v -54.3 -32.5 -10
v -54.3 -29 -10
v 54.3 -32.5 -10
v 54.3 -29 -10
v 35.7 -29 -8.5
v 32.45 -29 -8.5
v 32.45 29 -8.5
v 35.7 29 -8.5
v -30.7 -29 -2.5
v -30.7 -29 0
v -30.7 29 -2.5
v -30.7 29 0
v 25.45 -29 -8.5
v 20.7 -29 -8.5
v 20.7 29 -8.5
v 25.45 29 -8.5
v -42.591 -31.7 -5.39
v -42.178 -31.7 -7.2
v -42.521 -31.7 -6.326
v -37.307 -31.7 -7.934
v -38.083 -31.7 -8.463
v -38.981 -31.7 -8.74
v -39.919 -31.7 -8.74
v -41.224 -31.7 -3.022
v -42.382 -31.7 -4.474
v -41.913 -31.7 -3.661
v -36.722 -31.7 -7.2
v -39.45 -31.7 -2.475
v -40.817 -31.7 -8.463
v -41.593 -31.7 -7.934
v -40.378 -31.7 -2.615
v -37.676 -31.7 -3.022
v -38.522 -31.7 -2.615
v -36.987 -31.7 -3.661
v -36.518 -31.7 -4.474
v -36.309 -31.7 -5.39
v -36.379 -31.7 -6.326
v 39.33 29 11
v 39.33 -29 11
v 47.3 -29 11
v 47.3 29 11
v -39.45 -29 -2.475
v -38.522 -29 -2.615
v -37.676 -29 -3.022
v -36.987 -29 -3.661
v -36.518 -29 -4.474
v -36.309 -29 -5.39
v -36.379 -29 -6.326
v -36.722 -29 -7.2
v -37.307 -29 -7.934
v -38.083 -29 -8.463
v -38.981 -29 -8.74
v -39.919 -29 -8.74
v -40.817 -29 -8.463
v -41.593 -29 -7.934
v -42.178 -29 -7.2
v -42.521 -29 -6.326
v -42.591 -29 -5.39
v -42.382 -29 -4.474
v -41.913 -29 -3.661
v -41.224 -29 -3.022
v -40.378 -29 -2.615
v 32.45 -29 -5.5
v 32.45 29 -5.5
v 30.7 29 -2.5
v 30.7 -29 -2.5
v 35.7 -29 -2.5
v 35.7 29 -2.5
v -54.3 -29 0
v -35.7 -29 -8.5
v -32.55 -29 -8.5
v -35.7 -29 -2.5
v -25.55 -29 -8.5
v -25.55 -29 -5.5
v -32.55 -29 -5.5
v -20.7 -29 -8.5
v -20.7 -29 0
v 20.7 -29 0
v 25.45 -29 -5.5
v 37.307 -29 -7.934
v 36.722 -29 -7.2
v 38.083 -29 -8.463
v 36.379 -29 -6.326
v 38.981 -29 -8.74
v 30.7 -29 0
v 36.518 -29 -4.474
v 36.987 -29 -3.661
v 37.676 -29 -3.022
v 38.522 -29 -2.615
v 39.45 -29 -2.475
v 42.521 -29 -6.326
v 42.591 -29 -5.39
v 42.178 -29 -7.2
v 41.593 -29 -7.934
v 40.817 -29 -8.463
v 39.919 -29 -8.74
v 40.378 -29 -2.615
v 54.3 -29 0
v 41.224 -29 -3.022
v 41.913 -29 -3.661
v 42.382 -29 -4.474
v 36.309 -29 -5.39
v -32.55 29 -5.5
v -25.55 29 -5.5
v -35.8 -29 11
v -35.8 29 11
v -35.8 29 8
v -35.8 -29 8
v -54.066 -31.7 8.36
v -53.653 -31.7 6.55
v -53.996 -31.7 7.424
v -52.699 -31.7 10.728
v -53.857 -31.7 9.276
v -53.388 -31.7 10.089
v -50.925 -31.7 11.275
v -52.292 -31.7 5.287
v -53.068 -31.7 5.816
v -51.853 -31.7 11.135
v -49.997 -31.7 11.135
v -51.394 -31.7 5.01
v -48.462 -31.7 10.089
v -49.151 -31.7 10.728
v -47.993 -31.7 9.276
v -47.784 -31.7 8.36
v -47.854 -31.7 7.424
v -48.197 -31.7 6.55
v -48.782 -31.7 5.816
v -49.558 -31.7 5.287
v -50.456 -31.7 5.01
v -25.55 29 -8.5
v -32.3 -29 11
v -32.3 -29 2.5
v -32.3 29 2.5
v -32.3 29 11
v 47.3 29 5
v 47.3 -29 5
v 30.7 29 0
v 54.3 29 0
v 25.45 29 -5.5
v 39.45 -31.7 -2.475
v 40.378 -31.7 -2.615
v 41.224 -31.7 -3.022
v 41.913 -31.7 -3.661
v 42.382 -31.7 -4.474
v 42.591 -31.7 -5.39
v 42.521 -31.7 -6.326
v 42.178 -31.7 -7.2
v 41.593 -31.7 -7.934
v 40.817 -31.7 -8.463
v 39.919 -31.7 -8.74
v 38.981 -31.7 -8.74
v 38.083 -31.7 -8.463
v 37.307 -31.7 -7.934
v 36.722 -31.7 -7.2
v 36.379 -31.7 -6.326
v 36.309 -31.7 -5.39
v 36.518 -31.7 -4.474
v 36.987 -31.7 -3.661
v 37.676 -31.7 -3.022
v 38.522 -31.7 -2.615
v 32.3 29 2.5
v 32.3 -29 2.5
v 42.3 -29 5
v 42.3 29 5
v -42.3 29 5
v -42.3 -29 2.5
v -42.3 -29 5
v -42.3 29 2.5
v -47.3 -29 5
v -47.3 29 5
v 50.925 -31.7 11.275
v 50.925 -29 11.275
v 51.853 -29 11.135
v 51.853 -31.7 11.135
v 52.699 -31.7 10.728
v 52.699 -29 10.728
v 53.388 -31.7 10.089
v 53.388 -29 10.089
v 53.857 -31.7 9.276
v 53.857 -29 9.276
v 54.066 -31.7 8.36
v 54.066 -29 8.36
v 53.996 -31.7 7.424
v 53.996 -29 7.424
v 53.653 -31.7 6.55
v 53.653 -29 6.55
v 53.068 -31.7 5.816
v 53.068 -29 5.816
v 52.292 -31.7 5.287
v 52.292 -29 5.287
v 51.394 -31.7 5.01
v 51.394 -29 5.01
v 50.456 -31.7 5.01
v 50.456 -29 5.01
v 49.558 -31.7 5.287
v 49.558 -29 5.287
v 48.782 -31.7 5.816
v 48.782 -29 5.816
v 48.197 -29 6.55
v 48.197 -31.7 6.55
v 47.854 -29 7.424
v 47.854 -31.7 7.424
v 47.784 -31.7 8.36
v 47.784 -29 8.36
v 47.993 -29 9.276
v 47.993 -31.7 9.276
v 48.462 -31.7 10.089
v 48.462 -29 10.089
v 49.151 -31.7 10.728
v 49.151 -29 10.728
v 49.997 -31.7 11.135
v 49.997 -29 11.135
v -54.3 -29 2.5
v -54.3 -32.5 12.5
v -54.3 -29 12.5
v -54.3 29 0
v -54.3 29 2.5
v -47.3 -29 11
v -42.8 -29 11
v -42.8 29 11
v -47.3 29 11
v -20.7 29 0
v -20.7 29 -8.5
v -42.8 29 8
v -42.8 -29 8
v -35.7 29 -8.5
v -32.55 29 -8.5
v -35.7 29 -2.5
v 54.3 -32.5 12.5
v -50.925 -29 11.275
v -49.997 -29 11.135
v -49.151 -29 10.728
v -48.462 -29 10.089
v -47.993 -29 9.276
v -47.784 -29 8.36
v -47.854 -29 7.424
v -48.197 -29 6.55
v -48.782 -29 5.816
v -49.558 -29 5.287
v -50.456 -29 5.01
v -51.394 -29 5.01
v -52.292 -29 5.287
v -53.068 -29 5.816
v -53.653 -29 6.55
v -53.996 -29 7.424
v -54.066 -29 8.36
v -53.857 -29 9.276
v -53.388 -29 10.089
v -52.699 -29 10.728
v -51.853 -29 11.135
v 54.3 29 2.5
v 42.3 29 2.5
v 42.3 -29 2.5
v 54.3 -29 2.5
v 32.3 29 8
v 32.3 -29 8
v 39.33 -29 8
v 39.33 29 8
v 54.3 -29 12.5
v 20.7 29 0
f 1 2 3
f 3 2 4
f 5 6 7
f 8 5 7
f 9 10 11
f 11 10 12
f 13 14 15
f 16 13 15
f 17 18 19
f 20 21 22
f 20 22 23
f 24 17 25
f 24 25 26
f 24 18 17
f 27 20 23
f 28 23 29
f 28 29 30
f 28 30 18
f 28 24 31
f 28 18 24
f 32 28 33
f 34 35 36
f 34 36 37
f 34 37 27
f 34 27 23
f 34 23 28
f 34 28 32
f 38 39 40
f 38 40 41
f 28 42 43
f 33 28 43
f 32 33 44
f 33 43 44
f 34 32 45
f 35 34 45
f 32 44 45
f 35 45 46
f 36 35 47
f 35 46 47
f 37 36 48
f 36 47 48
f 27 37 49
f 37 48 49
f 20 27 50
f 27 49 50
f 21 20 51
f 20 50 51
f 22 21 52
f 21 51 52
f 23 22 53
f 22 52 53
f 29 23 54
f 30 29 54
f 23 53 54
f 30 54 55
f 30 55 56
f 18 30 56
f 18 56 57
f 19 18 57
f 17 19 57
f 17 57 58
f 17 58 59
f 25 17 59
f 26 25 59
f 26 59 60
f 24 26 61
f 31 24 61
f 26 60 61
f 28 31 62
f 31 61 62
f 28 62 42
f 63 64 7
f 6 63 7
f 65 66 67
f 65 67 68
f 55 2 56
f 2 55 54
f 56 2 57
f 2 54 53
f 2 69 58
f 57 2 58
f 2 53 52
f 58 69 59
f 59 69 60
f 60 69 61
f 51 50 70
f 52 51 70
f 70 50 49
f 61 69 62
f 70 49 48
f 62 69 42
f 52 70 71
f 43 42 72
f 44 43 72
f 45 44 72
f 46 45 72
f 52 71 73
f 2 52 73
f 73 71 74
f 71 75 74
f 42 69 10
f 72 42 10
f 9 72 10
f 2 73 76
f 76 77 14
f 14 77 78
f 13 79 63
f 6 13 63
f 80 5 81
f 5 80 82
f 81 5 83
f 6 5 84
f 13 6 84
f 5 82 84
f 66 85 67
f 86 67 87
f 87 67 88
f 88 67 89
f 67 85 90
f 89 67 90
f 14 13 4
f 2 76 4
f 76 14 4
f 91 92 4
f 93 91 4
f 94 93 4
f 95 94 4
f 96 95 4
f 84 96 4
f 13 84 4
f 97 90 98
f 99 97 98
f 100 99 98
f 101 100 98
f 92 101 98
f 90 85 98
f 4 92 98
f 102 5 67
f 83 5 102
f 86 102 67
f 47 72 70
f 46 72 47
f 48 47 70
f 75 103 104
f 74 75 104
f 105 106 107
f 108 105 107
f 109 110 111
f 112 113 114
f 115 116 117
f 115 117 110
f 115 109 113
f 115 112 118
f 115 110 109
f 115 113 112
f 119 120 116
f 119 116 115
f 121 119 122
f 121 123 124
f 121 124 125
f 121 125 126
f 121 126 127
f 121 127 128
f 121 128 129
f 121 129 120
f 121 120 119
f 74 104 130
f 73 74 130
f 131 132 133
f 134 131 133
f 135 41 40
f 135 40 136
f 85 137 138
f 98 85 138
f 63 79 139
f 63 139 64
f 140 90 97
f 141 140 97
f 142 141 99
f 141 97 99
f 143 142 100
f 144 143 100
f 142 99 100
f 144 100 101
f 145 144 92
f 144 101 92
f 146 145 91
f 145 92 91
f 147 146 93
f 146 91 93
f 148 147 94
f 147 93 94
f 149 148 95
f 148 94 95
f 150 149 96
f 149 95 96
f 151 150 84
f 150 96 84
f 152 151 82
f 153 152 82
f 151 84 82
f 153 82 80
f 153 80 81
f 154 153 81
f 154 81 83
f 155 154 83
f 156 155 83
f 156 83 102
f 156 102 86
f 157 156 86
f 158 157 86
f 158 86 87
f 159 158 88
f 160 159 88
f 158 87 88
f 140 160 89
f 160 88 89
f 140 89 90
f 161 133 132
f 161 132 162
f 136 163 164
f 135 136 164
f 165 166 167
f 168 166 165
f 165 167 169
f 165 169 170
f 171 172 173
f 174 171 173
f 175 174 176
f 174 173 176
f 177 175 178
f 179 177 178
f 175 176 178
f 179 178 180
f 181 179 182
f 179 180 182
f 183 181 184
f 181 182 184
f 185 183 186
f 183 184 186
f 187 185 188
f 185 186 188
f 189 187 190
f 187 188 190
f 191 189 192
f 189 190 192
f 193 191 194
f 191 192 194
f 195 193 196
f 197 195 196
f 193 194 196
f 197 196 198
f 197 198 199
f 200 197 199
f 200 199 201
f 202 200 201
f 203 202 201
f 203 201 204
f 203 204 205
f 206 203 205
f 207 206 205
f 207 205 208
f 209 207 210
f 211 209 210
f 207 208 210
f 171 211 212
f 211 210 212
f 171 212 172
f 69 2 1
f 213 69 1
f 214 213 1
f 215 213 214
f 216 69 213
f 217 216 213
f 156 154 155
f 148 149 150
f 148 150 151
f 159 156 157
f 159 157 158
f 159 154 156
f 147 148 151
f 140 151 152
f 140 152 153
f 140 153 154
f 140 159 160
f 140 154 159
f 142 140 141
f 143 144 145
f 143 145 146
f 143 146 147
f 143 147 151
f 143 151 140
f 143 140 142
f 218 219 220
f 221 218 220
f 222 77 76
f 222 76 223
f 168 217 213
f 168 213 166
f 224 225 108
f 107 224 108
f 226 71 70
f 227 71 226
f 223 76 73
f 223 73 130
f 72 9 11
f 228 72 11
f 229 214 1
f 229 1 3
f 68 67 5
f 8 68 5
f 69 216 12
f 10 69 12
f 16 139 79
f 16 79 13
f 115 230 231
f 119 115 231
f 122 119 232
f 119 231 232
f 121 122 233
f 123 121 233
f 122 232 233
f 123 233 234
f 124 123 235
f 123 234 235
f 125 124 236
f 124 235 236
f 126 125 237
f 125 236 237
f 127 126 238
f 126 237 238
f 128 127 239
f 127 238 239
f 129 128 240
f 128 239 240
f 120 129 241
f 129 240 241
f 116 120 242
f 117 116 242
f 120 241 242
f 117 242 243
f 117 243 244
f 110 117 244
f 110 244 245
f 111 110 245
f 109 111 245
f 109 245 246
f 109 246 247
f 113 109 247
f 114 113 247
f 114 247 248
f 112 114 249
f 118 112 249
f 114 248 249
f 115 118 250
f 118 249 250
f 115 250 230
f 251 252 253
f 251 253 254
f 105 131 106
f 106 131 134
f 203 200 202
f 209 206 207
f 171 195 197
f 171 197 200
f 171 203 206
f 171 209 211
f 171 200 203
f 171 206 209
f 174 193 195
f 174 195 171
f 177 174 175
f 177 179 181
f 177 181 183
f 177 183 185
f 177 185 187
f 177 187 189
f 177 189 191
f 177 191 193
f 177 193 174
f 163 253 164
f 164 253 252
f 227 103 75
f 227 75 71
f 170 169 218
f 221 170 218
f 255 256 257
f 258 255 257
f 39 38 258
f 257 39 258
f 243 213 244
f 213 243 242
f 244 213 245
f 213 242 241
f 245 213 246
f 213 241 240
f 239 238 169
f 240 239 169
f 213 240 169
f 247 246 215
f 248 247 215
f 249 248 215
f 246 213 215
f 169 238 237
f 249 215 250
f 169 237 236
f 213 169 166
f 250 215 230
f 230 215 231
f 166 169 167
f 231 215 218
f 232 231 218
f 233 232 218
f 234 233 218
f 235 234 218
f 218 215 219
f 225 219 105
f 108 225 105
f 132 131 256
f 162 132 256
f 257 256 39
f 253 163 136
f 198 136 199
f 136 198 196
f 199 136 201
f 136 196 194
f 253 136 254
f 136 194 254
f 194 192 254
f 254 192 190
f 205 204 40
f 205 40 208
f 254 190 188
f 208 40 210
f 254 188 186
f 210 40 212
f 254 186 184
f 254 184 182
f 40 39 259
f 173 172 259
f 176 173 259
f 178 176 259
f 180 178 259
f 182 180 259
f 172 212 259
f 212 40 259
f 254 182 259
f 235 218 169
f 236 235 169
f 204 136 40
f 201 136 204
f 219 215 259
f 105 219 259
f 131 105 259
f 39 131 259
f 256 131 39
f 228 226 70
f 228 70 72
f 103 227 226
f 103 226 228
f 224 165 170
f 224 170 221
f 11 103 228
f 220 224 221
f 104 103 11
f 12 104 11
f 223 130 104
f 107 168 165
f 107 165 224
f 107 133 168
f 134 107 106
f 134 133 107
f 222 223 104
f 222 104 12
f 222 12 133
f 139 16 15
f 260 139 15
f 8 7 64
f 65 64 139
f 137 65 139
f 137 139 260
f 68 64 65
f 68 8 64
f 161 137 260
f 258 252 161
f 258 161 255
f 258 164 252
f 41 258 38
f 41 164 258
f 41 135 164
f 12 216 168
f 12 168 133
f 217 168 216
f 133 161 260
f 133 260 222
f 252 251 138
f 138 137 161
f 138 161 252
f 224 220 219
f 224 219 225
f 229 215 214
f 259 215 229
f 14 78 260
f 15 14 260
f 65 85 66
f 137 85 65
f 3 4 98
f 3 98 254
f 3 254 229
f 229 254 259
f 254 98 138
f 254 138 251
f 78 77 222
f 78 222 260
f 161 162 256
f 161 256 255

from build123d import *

# Parameters (mm, degrees)
SKETCH1_W           = 108.6
SKETCH1_H           = 58
BOSS_EXTRUDE1_DEPTH = 2.5
SKETCH2_W           = 10
SKETCH2_H           = 58
BOSS_EXTRUDE2_DEPTH = 8.5
SKETCH3_W           = 6
SKETCH3_H           = 58
BOSS_EXTRUDE3_DEPTH = 5
SKETCH4_W           = 6
SKETCH4_H           = 58
BOSS_EXTRUDE4_DEPTH = 5
SKETCH5_W           = 10
SKETCH5_H           = 58
BOSS_EXTRUDE5_DEPTH = 8.5
SKETCH6_W           = 6
SKETCH6_H           = 58
BOSS_EXTRUDE6_DEPTH = 5
SKETCH7_W           = 6
SKETCH7_H           = 58
BOSS_EXTRUDE7_DEPTH = 5
SKETCH8_W           = 108.6
SKETCH8_H           = 22.5
BOSS_EXTRUDE8_DEPTH = 3.5
SKETCH9_R           = 3.15
CUT_EXTRUDE1_DEPTH  = 2.7
SKETCH10_W          = 7
SKETCH10_H          = 3
SKETCH10_W_2        = 7.05
CUT_EXTRUDE2_DEPTH  = 58


with BuildPart() as part:
    # Sketch1 → Boss-Extrude1 (new body)
    with BuildSketch(Plane.XY):
        Rectangle(SKETCH1_W, SKETCH1_H)
    extrude(amount=BOSS_EXTRUDE1_DEPTH)

    # Sketch2 → Boss-Extrude2 (add)
    with BuildSketch(Plane.XY.offset(2.5)):
        with Locations((-37.3, 0)):
            Rectangle(SKETCH2_W, SKETCH2_H)
        with Locations((37.3, 0)):
            Rectangle(SKETCH2_W, SKETCH2_H)
    extrude(amount=BOSS_EXTRUDE2_DEPTH)

    # Sketch3 → Boss-Extrude3 (add)
    with BuildSketch(Plane(origin=(42.3, 0, 0), x_dir=(0, 0, -1), z_dir=(1, 0, 0))):
        with Locations((-8, 0)):
            Rectangle(SKETCH3_W, SKETCH3_H)
    extrude(amount=BOSS_EXTRUDE3_DEPTH)

    # Sketch4 → Boss-Extrude4 (add)
    with BuildSketch(Plane.ZY.offset(42.3)):
        with Locations((8, 0)):
            Rectangle(SKETCH4_W, SKETCH4_H)
    extrude(amount=BOSS_EXTRUDE4_DEPTH)

    # Sketch5 → Boss-Extrude5 (add)
    with BuildSketch(Plane(origin=(0, 0, 0), x_dir=(-1, 0, 0), z_dir=(0, 0, -1))):
        with Locations((-25.7, 0)):
            Rectangle(SKETCH5_W, SKETCH5_H)
        with Locations((25.7, 0)):
            Rectangle(SKETCH5_W, SKETCH5_H)
    extrude(amount=BOSS_EXTRUDE5_DEPTH)

    # Sketch6 → Boss-Extrude6 (add)
    with BuildSketch(Plane(origin=(30.7, 0, 0), x_dir=(0, 0, -1), z_dir=(1, 0, 0))):
        with Locations((5.5, 0)):
            Rectangle(SKETCH6_W, SKETCH6_H)
    extrude(amount=BOSS_EXTRUDE6_DEPTH)

    # Sketch7 → Boss-Extrude7 (add)
    with BuildSketch(Plane.ZY.offset(30.7)):
        with Locations((-5.5, 0)):
            Rectangle(SKETCH7_W, SKETCH7_H)
    extrude(amount=BOSS_EXTRUDE7_DEPTH)

    # Sketch8 → Boss-Extrude8 (add)
    with BuildSketch(Plane.XZ.offset(29)):
        with Locations((0, 1.25)):
            Rectangle(SKETCH8_W, SKETCH8_H)
    extrude(amount=BOSS_EXTRUDE8_DEPTH)

    # Sketch9 → Cut-Extrude1 (cut)
    with BuildSketch(Plane(origin=(0, -29, 0), x_dir=(1, 0, 0), z_dir=(0, 1, 0))):
        with Locations(Location((-39.45, 5.625, 0), (0, 0, 270))):
            Circle(SKETCH9_R)
        with Locations(Location((-50.925, -8.125, 0), (0, 0, 270))):
            Circle(SKETCH9_R)
        with Locations(Location((39.45, 5.625, 0), (0, 0, 270))):
            Circle(SKETCH9_R)
        with Locations(Location((50.925, -8.125, 0), (0, 0, 270))):
            Circle(SKETCH9_R)
    extrude(amount=-CUT_EXTRUDE1_DEPTH, mode=Mode.SUBTRACT)

    # Sketch10 → Cut-Extrude2 (cut)
    with BuildSketch(Plane(origin=(0, 29, 0), x_dir=(1, 0, 0), z_dir=(0, 1, 0))):
        with Locations((28.95, 7)):
            Rectangle(SKETCH10_W, SKETCH10_H)
        with Locations((-29.05, 7)):
            Rectangle(SKETCH10_W, SKETCH10_H)
        with Locations((-39.3, -9.5)):
            Rectangle(SKETCH10_W, SKETCH10_H)
        with Locations((35.805, -9.5)):
            Rectangle(SKETCH10_W_2, SKETCH10_H)
    extrude(amount=-CUT_EXTRUDE2_DEPTH, mode=Mode.SUBTRACT)


solid = part.part
